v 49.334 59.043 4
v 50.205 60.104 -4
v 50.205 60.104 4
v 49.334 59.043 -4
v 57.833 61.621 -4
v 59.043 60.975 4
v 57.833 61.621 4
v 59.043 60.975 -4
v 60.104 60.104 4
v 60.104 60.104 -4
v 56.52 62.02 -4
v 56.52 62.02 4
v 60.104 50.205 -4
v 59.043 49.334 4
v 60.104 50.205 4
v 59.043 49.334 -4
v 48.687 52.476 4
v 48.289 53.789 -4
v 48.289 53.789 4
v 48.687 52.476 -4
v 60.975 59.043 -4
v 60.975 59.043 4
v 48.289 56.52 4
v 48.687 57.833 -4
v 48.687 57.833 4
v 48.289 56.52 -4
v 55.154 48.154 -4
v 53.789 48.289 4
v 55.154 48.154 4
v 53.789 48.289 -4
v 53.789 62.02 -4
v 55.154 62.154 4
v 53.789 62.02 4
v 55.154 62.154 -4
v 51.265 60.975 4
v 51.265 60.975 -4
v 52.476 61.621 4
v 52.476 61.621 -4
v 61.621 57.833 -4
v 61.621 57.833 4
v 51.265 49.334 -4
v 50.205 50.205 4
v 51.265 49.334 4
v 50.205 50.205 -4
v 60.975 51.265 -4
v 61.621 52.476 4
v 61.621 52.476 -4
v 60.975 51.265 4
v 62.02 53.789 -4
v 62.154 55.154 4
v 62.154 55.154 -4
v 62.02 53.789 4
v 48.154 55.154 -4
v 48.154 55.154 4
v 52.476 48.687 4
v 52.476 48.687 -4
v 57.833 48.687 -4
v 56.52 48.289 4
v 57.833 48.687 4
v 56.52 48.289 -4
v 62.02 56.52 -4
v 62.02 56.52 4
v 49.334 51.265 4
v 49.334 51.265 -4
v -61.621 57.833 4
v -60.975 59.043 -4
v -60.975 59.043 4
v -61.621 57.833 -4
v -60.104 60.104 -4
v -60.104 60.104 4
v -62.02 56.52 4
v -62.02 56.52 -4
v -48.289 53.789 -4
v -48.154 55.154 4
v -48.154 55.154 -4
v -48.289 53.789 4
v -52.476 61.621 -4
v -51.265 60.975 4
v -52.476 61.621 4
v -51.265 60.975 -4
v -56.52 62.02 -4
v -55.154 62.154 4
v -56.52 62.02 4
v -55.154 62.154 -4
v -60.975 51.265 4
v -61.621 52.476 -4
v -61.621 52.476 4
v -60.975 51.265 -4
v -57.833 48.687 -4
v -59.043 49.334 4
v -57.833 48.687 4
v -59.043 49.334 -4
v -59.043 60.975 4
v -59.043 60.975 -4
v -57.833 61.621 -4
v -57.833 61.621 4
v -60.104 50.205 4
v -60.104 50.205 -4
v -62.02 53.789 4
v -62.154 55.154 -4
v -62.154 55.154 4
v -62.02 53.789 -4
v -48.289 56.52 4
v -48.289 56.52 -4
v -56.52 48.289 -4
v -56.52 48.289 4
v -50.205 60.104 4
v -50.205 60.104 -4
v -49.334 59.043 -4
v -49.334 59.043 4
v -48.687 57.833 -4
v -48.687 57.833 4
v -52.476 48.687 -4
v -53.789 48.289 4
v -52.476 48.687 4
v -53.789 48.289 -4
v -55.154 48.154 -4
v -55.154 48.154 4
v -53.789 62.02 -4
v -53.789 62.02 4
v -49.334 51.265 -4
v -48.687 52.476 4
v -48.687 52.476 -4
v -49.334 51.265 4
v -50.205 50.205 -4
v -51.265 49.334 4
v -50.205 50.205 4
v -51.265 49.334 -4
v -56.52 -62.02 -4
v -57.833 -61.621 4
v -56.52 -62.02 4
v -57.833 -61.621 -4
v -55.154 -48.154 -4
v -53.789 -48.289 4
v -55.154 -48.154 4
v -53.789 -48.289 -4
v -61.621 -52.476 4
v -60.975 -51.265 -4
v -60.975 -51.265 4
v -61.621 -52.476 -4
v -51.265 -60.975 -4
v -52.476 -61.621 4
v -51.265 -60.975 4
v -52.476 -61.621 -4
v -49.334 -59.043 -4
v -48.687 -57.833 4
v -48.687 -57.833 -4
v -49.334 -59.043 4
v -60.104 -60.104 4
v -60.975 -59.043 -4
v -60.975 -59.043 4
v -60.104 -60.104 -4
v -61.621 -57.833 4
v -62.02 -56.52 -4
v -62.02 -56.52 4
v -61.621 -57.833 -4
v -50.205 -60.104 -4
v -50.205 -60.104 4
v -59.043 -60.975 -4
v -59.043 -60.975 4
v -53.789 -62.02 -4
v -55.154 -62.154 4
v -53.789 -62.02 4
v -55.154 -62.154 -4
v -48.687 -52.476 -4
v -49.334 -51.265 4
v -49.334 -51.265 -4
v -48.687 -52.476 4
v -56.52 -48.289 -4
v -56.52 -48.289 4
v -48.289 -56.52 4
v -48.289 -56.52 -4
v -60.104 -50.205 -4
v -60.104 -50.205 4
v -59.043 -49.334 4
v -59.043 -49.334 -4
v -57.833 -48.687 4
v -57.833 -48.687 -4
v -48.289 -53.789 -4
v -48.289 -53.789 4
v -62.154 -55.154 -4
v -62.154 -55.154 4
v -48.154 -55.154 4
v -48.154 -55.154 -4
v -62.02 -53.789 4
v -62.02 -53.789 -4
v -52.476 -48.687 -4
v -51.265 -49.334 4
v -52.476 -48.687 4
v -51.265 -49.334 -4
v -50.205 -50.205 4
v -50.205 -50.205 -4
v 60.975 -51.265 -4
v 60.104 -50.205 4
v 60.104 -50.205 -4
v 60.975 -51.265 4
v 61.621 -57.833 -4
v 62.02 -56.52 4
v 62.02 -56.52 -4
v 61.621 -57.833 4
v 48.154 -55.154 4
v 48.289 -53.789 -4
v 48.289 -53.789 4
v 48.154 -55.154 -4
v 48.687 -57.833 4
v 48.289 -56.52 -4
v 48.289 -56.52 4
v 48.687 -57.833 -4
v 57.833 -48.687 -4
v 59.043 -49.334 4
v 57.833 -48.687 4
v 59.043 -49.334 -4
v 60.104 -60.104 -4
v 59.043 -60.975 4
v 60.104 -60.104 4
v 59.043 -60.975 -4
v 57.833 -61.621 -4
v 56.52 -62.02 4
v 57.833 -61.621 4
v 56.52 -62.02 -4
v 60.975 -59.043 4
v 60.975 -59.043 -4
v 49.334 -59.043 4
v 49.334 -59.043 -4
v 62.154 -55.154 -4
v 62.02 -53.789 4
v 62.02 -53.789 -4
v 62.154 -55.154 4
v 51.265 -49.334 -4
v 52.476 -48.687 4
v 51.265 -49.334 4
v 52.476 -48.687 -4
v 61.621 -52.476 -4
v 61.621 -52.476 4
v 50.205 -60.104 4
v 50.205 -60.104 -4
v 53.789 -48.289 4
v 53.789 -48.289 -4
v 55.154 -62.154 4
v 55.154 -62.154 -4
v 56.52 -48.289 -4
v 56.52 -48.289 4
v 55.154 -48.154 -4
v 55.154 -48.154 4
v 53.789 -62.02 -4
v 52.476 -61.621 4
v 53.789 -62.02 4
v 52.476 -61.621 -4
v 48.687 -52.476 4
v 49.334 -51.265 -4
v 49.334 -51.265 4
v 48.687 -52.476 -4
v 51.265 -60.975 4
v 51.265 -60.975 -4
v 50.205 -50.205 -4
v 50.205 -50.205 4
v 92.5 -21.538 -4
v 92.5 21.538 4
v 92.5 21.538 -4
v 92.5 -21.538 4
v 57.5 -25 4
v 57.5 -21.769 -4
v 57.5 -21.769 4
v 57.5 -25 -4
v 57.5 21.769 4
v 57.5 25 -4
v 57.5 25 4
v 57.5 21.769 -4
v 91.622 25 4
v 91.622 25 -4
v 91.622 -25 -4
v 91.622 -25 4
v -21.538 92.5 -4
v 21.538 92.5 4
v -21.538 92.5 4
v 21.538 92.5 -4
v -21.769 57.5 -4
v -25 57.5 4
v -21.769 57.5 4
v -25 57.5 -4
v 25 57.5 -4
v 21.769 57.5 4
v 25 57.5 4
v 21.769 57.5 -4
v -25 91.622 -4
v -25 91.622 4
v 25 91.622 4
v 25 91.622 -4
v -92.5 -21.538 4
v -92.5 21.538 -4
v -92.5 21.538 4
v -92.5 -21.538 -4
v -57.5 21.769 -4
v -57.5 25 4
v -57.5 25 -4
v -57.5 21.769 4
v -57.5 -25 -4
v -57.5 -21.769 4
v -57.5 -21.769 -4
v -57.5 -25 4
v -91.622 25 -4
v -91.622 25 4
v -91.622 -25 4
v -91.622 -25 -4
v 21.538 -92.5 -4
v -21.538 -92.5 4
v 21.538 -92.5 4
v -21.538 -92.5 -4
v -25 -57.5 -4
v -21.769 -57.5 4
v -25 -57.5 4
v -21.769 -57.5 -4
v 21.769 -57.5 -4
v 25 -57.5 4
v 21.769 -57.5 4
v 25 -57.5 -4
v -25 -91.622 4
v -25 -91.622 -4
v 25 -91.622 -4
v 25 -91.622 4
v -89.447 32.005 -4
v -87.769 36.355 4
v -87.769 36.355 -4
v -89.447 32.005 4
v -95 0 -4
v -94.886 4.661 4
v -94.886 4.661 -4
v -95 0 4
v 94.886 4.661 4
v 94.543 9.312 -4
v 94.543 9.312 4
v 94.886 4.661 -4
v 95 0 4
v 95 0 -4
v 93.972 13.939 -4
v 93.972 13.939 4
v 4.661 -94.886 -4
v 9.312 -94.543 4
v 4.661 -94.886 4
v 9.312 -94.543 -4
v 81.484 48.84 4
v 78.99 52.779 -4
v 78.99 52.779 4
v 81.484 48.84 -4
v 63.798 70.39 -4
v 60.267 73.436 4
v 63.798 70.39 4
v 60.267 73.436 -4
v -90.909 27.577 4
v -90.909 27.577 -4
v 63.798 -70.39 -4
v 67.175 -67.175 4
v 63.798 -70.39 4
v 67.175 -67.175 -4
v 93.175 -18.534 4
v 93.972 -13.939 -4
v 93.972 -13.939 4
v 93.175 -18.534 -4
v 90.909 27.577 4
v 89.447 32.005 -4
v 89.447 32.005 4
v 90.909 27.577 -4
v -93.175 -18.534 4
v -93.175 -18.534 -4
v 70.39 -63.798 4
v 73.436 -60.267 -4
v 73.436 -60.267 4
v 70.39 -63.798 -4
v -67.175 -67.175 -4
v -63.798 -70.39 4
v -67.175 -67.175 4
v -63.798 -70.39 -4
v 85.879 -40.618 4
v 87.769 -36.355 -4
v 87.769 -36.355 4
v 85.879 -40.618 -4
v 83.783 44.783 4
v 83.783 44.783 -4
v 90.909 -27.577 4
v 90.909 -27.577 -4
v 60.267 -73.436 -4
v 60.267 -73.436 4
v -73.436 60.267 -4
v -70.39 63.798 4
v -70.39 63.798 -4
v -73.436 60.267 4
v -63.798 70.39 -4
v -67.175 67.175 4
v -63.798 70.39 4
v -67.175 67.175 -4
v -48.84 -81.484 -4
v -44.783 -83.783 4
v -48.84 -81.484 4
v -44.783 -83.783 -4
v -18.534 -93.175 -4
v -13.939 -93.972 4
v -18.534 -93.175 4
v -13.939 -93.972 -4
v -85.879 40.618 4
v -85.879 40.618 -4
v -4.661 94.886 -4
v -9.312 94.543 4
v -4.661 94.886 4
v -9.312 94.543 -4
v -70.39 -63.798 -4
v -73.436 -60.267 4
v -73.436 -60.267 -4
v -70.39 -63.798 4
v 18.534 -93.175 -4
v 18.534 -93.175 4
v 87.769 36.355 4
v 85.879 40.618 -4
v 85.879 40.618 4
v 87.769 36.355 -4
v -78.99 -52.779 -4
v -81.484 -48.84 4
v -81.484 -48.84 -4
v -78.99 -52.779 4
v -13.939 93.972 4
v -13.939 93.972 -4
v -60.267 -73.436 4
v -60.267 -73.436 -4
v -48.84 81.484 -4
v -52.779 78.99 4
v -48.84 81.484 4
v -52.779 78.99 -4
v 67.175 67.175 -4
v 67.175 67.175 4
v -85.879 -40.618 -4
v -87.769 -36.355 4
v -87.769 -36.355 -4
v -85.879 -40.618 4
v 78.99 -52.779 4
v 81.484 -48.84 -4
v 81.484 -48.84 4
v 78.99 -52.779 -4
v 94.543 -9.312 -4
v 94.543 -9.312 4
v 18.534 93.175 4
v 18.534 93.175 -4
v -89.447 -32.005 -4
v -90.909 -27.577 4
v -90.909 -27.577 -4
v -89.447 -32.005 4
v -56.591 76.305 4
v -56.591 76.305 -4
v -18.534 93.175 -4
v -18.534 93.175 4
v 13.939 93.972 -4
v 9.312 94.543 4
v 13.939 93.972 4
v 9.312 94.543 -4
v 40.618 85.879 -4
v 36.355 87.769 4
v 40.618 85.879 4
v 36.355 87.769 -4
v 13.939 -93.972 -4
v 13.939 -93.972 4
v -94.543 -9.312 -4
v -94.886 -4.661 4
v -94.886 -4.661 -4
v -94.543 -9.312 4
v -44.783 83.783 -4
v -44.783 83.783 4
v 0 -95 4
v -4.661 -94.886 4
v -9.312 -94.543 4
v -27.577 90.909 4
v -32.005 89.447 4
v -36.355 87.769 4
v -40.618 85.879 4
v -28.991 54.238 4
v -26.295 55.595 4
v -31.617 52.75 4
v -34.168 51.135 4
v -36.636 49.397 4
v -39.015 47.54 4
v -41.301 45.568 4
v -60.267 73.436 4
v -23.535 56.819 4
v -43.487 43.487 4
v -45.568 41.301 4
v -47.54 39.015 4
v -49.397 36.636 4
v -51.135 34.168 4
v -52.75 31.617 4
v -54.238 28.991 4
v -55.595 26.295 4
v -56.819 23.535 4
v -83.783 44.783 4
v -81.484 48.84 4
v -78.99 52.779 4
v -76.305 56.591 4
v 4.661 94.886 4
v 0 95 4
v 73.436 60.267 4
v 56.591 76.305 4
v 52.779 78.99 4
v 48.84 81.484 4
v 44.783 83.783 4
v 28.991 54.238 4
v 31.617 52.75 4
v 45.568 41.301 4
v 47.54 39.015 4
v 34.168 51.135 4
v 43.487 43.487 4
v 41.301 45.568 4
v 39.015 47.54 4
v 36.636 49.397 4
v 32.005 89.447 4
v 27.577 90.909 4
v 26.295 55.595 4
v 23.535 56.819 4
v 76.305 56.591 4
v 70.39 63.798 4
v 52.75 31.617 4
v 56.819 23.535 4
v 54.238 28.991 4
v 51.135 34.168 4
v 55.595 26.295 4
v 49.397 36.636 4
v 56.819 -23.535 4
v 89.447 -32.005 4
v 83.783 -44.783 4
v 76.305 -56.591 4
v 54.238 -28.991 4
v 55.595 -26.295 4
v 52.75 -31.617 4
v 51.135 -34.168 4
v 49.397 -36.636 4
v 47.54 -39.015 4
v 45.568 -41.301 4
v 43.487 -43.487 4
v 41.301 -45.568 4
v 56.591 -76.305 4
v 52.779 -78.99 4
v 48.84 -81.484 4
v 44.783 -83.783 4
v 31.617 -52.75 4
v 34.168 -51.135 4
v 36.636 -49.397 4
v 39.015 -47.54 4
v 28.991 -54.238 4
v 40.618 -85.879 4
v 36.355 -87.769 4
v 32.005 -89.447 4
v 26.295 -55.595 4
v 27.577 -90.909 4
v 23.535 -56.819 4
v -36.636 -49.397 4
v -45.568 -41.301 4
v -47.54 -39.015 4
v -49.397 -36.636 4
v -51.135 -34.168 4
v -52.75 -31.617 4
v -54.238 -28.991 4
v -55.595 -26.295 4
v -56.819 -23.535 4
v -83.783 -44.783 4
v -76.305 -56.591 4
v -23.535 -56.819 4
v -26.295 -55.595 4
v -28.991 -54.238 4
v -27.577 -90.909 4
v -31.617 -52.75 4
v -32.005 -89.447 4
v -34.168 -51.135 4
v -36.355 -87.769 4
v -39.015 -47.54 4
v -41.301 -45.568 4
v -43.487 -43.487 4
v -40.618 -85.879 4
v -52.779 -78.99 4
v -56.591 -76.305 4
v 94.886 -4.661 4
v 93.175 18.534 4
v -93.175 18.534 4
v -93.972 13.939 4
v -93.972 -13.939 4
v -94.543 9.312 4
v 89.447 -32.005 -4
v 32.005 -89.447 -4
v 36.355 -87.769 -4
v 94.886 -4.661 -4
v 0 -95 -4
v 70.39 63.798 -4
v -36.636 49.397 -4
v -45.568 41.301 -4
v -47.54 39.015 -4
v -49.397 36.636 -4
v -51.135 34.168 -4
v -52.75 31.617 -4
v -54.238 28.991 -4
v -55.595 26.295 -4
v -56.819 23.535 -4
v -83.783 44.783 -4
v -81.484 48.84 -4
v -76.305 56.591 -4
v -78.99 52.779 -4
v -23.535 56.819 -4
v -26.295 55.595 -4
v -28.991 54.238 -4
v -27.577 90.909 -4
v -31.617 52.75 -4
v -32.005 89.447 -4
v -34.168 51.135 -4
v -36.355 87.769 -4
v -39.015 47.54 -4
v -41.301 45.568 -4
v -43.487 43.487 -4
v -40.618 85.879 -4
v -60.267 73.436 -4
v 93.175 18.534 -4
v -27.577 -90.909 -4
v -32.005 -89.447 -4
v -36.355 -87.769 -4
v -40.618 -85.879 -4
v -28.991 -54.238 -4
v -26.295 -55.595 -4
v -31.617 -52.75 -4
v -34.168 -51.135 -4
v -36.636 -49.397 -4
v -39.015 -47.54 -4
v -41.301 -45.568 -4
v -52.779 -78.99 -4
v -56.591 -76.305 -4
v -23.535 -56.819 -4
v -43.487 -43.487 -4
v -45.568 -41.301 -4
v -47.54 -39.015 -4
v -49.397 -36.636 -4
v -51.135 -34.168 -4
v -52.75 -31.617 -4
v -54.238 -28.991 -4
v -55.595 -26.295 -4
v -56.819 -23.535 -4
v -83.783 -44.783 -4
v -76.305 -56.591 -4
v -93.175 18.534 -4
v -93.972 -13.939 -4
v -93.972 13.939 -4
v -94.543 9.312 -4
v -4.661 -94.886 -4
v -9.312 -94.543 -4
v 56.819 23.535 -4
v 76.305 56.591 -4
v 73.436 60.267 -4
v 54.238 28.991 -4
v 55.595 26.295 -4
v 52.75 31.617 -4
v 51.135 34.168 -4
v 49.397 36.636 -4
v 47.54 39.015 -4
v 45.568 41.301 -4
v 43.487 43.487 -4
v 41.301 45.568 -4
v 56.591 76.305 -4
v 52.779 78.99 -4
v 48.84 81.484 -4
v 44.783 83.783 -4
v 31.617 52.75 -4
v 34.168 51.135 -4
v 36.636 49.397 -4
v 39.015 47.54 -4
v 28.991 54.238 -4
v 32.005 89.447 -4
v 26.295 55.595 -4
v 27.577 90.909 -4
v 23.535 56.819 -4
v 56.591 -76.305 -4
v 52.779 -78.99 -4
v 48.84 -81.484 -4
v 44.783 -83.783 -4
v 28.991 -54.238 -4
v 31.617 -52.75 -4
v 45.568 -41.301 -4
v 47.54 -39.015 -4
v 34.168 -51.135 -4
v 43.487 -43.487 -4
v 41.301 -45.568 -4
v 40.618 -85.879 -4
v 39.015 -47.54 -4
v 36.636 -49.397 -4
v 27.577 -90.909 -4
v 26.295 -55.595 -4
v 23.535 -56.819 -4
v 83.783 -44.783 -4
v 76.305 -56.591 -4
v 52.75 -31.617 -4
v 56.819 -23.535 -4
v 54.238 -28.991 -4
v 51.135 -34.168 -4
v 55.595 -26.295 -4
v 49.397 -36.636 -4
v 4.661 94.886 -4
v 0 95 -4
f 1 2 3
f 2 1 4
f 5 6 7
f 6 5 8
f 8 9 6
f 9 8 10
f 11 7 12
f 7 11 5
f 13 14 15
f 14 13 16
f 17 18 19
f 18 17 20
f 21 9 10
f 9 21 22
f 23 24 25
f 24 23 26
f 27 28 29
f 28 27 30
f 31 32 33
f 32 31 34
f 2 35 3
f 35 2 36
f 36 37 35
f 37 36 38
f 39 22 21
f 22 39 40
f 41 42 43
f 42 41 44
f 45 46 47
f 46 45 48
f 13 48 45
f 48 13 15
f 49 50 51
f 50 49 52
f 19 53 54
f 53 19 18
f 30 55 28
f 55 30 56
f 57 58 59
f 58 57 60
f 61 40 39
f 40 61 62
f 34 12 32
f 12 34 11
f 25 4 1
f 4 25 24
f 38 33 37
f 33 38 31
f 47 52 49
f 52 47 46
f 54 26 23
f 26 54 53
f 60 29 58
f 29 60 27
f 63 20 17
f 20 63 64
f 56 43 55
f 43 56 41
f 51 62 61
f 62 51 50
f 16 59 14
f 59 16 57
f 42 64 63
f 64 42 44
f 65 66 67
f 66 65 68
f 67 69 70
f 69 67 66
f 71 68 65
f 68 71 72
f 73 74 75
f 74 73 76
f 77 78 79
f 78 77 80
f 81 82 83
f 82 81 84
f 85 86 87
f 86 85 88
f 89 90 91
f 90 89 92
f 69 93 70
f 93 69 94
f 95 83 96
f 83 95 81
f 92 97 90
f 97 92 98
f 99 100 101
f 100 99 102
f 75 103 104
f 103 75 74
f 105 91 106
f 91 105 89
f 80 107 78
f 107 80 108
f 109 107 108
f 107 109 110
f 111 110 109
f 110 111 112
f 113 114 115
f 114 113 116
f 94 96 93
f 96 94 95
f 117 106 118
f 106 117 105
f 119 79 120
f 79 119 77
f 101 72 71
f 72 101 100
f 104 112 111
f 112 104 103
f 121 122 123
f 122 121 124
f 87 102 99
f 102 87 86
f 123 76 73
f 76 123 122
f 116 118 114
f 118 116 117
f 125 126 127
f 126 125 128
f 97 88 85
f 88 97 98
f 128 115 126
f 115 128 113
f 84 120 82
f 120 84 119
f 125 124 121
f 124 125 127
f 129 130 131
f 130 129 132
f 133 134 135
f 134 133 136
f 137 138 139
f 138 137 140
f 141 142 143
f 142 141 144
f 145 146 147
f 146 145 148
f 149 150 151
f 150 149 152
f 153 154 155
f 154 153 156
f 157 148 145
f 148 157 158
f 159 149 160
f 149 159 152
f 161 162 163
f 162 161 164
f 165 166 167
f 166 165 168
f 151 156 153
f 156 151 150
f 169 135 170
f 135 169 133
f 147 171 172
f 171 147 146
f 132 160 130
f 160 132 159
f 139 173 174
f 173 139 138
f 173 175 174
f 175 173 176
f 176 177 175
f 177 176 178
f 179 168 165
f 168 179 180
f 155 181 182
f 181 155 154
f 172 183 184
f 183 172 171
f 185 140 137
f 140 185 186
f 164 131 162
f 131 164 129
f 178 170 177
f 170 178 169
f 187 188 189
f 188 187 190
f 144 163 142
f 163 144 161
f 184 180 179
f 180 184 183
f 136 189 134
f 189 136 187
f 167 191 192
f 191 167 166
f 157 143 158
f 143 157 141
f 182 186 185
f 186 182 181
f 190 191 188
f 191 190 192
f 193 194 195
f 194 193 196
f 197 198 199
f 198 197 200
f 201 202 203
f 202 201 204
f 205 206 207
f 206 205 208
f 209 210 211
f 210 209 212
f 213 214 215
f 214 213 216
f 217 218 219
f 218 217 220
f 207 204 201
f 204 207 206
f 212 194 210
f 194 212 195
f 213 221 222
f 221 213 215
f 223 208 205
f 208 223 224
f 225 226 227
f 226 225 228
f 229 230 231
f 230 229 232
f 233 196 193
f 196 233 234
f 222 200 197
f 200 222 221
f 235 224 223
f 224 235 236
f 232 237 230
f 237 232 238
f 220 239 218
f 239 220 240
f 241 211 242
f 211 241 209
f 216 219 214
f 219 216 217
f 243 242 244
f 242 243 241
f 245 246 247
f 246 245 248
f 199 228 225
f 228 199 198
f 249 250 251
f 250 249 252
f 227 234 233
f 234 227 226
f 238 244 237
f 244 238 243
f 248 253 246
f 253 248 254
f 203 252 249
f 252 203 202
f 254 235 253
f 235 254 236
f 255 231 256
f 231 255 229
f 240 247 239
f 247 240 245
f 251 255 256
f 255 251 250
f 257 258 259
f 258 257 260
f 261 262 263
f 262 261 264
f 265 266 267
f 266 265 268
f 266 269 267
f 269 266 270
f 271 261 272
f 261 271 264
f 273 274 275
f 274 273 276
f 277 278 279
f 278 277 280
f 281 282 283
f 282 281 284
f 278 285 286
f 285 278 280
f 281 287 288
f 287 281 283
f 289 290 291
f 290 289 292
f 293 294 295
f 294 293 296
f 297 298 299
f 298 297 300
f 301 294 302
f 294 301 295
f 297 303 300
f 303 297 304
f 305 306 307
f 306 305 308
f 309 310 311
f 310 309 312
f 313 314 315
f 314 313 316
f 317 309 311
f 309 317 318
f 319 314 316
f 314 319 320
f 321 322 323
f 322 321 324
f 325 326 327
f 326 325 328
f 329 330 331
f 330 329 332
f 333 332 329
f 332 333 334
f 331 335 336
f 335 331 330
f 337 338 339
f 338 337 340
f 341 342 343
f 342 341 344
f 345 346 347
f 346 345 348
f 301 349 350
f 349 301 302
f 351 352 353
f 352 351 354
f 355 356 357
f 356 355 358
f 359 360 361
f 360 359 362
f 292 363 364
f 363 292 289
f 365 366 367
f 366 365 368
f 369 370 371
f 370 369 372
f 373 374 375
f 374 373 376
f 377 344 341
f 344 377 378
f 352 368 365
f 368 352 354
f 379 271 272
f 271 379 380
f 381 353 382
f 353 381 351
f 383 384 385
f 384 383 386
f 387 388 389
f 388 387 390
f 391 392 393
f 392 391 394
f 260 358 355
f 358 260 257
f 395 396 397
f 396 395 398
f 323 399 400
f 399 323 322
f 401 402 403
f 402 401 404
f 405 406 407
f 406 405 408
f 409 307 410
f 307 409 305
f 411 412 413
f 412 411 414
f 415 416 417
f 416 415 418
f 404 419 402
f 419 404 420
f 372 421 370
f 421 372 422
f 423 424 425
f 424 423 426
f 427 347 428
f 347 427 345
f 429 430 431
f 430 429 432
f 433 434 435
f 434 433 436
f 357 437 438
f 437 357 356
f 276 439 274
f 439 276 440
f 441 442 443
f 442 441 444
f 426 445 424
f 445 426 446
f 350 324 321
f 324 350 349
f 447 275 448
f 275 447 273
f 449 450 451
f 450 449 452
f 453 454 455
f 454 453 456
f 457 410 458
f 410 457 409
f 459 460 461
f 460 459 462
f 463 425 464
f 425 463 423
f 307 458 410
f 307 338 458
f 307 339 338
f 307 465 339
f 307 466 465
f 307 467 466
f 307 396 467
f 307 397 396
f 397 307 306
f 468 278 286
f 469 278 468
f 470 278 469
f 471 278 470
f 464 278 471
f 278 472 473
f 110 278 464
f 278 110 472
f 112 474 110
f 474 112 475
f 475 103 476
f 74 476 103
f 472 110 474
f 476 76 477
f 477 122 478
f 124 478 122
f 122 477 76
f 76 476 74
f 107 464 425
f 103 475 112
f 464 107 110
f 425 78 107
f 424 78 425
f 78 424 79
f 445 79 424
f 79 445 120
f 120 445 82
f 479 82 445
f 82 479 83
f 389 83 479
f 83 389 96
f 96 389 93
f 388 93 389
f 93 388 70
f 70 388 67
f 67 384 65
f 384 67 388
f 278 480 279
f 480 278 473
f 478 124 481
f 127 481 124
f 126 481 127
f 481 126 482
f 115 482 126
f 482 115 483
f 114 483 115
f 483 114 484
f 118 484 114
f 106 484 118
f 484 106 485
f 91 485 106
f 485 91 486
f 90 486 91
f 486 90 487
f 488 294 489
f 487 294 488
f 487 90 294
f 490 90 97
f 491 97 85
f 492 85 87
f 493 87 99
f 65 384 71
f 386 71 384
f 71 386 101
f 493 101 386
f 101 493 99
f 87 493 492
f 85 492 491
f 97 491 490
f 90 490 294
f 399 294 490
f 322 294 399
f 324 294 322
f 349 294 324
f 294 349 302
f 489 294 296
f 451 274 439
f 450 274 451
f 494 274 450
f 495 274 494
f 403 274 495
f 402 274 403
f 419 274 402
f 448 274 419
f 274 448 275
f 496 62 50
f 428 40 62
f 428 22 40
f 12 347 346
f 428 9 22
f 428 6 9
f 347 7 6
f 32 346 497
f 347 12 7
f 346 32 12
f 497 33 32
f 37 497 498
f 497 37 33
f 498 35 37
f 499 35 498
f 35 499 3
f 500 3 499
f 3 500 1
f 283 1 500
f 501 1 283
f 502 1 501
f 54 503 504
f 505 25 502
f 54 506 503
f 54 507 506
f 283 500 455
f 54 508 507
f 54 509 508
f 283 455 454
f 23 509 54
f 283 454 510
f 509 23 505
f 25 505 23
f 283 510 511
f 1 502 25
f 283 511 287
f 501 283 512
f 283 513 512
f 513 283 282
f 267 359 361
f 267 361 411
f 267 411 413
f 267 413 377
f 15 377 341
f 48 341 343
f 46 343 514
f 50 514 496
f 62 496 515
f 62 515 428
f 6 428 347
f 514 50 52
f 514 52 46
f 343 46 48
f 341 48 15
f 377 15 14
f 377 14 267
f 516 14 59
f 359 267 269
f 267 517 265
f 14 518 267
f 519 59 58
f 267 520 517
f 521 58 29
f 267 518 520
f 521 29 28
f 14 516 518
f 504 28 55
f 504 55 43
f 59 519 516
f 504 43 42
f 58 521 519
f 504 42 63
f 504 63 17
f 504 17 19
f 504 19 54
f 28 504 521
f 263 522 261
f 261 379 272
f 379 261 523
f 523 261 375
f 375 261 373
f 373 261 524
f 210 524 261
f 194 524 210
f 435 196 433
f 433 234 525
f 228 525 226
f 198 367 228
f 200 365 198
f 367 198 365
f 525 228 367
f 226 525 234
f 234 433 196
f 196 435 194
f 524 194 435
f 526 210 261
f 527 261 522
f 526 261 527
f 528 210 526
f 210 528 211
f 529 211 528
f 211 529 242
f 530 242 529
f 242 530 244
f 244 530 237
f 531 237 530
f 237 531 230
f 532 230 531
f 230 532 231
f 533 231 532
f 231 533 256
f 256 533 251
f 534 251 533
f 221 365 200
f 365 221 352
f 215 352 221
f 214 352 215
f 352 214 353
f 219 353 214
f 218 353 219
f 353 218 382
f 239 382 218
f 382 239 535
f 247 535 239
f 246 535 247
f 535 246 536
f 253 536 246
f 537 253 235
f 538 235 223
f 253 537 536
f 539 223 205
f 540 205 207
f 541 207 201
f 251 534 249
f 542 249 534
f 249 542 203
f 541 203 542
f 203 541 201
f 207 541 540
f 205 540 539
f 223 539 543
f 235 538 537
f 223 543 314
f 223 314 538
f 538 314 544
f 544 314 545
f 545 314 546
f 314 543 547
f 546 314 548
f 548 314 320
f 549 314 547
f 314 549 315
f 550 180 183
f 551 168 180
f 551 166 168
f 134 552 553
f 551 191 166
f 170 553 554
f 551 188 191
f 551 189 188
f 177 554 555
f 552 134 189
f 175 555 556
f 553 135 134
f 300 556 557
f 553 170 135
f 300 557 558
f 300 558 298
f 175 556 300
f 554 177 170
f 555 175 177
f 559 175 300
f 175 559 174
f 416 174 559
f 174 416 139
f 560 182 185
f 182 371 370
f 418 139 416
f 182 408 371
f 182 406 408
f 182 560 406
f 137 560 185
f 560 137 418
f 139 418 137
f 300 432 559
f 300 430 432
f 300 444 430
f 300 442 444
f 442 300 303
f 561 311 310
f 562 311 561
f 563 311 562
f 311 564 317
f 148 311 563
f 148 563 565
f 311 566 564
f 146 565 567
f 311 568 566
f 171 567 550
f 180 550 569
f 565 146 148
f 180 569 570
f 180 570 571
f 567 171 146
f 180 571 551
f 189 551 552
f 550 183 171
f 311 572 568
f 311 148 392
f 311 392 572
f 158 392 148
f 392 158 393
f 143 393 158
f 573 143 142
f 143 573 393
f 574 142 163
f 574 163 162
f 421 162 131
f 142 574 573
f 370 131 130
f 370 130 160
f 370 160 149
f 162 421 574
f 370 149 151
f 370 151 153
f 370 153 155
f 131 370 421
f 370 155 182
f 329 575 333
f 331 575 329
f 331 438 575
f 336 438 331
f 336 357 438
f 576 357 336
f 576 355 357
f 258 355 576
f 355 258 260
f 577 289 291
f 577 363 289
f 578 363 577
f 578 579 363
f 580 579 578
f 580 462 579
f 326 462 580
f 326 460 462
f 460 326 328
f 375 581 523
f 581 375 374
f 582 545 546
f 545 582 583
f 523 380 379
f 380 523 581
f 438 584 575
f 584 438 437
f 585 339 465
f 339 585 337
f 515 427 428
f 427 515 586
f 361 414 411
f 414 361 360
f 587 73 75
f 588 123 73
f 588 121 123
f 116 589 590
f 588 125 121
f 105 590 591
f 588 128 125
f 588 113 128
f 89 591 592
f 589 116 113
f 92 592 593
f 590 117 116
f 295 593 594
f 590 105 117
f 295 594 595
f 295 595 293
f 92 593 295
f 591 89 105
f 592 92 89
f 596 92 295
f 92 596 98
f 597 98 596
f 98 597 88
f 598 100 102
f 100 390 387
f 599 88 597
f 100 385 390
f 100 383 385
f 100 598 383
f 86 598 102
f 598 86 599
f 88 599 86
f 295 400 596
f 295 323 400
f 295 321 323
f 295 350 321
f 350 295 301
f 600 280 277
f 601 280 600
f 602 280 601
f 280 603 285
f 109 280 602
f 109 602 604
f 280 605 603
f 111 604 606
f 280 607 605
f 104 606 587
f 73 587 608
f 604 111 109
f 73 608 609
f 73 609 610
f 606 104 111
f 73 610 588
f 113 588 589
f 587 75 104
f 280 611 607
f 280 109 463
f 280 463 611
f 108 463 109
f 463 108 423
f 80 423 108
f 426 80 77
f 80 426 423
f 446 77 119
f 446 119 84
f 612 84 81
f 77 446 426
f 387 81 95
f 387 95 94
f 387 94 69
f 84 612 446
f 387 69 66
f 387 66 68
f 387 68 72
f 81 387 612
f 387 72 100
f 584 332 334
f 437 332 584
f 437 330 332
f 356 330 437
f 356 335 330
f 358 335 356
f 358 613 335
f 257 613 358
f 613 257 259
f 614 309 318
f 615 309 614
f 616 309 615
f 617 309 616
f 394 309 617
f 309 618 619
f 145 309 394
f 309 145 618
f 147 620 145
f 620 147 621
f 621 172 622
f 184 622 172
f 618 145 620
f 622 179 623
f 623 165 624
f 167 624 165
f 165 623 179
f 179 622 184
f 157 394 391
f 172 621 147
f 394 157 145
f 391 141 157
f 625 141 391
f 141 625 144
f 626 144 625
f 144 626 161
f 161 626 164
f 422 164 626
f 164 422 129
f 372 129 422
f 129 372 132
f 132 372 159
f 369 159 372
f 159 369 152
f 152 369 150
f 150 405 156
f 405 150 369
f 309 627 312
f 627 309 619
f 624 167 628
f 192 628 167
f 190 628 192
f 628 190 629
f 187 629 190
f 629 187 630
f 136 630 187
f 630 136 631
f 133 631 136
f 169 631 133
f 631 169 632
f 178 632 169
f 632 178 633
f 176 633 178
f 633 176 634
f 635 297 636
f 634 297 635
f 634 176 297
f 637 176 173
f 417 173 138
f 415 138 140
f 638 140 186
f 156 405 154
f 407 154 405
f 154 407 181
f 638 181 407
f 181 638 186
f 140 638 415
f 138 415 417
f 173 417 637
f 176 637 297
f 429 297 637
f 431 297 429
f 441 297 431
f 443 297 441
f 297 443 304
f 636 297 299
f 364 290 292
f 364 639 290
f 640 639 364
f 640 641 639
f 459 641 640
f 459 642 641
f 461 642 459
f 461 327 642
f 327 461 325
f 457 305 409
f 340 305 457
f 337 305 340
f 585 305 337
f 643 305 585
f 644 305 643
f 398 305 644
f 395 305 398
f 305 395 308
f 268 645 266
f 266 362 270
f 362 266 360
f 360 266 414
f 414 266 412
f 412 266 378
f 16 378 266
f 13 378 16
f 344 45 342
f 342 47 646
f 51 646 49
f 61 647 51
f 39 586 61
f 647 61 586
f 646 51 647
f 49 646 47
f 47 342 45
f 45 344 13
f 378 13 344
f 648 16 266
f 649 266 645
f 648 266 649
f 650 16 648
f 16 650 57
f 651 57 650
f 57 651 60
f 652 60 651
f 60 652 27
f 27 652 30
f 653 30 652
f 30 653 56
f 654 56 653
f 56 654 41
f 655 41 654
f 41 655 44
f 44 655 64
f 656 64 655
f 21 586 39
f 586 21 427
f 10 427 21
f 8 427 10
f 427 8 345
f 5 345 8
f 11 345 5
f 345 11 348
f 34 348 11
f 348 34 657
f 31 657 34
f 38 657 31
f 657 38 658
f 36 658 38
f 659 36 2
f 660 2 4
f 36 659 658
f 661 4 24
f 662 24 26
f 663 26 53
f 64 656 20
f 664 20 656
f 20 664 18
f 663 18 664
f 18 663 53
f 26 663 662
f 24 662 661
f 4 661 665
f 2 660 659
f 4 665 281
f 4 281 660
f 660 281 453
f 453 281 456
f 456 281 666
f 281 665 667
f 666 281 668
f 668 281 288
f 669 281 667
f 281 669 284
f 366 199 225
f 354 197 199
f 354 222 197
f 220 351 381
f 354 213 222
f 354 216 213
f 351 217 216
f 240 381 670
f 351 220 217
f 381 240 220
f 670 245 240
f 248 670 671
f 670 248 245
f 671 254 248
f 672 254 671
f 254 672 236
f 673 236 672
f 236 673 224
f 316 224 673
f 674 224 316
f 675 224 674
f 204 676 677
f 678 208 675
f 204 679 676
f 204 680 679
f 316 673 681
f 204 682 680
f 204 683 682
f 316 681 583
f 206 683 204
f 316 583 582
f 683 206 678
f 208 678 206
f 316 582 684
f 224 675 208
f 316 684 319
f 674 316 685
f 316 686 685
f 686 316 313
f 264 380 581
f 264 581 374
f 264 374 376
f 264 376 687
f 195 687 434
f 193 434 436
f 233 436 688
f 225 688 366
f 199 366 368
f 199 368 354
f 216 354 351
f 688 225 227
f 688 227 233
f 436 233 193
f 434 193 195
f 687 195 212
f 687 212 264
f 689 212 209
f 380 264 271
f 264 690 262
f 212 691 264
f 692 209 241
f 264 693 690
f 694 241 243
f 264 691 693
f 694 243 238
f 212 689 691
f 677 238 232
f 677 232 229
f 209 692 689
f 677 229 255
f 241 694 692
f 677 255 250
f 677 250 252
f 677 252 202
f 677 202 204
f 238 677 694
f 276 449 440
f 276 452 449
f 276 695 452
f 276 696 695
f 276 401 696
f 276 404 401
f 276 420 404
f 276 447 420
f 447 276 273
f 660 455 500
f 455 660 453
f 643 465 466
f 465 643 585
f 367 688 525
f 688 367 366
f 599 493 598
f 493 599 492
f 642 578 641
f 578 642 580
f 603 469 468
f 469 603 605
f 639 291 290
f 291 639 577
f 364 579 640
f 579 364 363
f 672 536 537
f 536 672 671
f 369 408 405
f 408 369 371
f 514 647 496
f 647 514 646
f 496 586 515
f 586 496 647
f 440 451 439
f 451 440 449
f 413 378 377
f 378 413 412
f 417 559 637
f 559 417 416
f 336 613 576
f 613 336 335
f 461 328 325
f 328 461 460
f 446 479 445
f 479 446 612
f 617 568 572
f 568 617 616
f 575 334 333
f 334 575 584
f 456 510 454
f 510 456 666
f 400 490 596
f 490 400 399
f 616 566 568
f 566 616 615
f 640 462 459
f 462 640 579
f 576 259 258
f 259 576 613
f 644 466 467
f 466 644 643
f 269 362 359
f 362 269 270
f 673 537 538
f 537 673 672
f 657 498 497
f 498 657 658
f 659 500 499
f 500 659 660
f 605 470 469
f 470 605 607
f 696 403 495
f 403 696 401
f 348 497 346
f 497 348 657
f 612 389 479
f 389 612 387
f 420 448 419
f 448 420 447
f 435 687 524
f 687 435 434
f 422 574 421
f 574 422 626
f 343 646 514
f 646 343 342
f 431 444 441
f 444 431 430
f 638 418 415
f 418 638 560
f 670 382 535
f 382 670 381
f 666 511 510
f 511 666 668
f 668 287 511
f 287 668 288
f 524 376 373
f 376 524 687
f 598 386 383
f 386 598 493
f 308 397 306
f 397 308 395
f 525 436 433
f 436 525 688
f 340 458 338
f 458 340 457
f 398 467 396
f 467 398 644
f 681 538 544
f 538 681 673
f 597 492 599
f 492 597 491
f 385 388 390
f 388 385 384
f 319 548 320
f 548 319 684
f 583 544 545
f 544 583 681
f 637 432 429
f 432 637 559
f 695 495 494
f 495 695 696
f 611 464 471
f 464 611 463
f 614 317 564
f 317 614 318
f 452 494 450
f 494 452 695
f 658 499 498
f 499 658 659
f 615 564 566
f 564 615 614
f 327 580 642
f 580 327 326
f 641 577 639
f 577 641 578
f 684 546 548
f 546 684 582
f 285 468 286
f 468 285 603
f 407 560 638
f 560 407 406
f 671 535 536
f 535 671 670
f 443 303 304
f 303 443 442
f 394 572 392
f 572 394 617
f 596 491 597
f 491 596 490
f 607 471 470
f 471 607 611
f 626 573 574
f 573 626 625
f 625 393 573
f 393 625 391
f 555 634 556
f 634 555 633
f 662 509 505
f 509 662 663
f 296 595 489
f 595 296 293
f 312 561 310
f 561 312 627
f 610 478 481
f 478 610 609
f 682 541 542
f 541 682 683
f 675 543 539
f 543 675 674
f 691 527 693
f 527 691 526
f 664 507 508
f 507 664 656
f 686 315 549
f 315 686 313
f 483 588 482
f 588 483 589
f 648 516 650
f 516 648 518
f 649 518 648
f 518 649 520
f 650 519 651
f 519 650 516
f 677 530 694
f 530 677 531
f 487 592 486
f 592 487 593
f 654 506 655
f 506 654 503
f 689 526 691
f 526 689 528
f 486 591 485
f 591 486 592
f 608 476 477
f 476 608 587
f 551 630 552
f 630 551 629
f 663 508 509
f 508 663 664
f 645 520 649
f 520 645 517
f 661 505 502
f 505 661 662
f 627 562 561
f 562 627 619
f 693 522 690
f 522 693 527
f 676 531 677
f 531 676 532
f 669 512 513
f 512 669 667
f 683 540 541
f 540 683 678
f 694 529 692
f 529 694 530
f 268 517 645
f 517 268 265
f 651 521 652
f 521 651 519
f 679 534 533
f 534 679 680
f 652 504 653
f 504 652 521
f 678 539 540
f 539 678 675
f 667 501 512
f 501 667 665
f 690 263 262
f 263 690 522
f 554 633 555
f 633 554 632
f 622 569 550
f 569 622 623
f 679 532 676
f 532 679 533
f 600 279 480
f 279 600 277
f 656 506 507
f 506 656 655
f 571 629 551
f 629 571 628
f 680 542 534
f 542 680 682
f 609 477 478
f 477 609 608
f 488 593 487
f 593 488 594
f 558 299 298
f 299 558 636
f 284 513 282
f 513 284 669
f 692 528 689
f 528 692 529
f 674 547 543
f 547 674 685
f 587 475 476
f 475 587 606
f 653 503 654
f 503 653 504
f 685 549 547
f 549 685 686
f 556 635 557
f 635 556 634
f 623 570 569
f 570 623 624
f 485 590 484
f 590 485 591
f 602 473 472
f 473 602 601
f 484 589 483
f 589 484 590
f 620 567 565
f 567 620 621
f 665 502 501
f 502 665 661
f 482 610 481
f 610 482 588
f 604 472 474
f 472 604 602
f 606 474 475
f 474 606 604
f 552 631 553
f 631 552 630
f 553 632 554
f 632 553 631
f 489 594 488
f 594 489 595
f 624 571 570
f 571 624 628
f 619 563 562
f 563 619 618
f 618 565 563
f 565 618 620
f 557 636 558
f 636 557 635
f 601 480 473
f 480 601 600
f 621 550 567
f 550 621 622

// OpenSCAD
/*
 * CD/DVD Version - Assembly Jig
 * Larger version for 120mm discs.
 * Critical for keeping the stack perfectly straight during clamping.
 */

module cd_dvd_assembly_jig() {
    difference() {
        // Large base plate
        cylinder(d=120 + 70, h=8, center=true, $fn=128);
        
        // Guide posts (taller for thicker stack)
        for (i = [0:3]) {
            rotate([0,0,i*90 + 45])
                translate([120/2 + 18, 0, 0])
                    cylinder(d=14, h=65, center=true, $fn=32);
        }
        
        // Central clearance for the disc stack
        cylinder(d=120 + 3, h=10, center=true, $fn=128);
        
        // Access cutouts
        for (i = [0:3]) {
            rotate([0,0,i*90])
                translate([75, 0, 0])
                    cube([35, 50, 12], center=true);
        }
    }
}

cd_dvd_assembly_jig();
